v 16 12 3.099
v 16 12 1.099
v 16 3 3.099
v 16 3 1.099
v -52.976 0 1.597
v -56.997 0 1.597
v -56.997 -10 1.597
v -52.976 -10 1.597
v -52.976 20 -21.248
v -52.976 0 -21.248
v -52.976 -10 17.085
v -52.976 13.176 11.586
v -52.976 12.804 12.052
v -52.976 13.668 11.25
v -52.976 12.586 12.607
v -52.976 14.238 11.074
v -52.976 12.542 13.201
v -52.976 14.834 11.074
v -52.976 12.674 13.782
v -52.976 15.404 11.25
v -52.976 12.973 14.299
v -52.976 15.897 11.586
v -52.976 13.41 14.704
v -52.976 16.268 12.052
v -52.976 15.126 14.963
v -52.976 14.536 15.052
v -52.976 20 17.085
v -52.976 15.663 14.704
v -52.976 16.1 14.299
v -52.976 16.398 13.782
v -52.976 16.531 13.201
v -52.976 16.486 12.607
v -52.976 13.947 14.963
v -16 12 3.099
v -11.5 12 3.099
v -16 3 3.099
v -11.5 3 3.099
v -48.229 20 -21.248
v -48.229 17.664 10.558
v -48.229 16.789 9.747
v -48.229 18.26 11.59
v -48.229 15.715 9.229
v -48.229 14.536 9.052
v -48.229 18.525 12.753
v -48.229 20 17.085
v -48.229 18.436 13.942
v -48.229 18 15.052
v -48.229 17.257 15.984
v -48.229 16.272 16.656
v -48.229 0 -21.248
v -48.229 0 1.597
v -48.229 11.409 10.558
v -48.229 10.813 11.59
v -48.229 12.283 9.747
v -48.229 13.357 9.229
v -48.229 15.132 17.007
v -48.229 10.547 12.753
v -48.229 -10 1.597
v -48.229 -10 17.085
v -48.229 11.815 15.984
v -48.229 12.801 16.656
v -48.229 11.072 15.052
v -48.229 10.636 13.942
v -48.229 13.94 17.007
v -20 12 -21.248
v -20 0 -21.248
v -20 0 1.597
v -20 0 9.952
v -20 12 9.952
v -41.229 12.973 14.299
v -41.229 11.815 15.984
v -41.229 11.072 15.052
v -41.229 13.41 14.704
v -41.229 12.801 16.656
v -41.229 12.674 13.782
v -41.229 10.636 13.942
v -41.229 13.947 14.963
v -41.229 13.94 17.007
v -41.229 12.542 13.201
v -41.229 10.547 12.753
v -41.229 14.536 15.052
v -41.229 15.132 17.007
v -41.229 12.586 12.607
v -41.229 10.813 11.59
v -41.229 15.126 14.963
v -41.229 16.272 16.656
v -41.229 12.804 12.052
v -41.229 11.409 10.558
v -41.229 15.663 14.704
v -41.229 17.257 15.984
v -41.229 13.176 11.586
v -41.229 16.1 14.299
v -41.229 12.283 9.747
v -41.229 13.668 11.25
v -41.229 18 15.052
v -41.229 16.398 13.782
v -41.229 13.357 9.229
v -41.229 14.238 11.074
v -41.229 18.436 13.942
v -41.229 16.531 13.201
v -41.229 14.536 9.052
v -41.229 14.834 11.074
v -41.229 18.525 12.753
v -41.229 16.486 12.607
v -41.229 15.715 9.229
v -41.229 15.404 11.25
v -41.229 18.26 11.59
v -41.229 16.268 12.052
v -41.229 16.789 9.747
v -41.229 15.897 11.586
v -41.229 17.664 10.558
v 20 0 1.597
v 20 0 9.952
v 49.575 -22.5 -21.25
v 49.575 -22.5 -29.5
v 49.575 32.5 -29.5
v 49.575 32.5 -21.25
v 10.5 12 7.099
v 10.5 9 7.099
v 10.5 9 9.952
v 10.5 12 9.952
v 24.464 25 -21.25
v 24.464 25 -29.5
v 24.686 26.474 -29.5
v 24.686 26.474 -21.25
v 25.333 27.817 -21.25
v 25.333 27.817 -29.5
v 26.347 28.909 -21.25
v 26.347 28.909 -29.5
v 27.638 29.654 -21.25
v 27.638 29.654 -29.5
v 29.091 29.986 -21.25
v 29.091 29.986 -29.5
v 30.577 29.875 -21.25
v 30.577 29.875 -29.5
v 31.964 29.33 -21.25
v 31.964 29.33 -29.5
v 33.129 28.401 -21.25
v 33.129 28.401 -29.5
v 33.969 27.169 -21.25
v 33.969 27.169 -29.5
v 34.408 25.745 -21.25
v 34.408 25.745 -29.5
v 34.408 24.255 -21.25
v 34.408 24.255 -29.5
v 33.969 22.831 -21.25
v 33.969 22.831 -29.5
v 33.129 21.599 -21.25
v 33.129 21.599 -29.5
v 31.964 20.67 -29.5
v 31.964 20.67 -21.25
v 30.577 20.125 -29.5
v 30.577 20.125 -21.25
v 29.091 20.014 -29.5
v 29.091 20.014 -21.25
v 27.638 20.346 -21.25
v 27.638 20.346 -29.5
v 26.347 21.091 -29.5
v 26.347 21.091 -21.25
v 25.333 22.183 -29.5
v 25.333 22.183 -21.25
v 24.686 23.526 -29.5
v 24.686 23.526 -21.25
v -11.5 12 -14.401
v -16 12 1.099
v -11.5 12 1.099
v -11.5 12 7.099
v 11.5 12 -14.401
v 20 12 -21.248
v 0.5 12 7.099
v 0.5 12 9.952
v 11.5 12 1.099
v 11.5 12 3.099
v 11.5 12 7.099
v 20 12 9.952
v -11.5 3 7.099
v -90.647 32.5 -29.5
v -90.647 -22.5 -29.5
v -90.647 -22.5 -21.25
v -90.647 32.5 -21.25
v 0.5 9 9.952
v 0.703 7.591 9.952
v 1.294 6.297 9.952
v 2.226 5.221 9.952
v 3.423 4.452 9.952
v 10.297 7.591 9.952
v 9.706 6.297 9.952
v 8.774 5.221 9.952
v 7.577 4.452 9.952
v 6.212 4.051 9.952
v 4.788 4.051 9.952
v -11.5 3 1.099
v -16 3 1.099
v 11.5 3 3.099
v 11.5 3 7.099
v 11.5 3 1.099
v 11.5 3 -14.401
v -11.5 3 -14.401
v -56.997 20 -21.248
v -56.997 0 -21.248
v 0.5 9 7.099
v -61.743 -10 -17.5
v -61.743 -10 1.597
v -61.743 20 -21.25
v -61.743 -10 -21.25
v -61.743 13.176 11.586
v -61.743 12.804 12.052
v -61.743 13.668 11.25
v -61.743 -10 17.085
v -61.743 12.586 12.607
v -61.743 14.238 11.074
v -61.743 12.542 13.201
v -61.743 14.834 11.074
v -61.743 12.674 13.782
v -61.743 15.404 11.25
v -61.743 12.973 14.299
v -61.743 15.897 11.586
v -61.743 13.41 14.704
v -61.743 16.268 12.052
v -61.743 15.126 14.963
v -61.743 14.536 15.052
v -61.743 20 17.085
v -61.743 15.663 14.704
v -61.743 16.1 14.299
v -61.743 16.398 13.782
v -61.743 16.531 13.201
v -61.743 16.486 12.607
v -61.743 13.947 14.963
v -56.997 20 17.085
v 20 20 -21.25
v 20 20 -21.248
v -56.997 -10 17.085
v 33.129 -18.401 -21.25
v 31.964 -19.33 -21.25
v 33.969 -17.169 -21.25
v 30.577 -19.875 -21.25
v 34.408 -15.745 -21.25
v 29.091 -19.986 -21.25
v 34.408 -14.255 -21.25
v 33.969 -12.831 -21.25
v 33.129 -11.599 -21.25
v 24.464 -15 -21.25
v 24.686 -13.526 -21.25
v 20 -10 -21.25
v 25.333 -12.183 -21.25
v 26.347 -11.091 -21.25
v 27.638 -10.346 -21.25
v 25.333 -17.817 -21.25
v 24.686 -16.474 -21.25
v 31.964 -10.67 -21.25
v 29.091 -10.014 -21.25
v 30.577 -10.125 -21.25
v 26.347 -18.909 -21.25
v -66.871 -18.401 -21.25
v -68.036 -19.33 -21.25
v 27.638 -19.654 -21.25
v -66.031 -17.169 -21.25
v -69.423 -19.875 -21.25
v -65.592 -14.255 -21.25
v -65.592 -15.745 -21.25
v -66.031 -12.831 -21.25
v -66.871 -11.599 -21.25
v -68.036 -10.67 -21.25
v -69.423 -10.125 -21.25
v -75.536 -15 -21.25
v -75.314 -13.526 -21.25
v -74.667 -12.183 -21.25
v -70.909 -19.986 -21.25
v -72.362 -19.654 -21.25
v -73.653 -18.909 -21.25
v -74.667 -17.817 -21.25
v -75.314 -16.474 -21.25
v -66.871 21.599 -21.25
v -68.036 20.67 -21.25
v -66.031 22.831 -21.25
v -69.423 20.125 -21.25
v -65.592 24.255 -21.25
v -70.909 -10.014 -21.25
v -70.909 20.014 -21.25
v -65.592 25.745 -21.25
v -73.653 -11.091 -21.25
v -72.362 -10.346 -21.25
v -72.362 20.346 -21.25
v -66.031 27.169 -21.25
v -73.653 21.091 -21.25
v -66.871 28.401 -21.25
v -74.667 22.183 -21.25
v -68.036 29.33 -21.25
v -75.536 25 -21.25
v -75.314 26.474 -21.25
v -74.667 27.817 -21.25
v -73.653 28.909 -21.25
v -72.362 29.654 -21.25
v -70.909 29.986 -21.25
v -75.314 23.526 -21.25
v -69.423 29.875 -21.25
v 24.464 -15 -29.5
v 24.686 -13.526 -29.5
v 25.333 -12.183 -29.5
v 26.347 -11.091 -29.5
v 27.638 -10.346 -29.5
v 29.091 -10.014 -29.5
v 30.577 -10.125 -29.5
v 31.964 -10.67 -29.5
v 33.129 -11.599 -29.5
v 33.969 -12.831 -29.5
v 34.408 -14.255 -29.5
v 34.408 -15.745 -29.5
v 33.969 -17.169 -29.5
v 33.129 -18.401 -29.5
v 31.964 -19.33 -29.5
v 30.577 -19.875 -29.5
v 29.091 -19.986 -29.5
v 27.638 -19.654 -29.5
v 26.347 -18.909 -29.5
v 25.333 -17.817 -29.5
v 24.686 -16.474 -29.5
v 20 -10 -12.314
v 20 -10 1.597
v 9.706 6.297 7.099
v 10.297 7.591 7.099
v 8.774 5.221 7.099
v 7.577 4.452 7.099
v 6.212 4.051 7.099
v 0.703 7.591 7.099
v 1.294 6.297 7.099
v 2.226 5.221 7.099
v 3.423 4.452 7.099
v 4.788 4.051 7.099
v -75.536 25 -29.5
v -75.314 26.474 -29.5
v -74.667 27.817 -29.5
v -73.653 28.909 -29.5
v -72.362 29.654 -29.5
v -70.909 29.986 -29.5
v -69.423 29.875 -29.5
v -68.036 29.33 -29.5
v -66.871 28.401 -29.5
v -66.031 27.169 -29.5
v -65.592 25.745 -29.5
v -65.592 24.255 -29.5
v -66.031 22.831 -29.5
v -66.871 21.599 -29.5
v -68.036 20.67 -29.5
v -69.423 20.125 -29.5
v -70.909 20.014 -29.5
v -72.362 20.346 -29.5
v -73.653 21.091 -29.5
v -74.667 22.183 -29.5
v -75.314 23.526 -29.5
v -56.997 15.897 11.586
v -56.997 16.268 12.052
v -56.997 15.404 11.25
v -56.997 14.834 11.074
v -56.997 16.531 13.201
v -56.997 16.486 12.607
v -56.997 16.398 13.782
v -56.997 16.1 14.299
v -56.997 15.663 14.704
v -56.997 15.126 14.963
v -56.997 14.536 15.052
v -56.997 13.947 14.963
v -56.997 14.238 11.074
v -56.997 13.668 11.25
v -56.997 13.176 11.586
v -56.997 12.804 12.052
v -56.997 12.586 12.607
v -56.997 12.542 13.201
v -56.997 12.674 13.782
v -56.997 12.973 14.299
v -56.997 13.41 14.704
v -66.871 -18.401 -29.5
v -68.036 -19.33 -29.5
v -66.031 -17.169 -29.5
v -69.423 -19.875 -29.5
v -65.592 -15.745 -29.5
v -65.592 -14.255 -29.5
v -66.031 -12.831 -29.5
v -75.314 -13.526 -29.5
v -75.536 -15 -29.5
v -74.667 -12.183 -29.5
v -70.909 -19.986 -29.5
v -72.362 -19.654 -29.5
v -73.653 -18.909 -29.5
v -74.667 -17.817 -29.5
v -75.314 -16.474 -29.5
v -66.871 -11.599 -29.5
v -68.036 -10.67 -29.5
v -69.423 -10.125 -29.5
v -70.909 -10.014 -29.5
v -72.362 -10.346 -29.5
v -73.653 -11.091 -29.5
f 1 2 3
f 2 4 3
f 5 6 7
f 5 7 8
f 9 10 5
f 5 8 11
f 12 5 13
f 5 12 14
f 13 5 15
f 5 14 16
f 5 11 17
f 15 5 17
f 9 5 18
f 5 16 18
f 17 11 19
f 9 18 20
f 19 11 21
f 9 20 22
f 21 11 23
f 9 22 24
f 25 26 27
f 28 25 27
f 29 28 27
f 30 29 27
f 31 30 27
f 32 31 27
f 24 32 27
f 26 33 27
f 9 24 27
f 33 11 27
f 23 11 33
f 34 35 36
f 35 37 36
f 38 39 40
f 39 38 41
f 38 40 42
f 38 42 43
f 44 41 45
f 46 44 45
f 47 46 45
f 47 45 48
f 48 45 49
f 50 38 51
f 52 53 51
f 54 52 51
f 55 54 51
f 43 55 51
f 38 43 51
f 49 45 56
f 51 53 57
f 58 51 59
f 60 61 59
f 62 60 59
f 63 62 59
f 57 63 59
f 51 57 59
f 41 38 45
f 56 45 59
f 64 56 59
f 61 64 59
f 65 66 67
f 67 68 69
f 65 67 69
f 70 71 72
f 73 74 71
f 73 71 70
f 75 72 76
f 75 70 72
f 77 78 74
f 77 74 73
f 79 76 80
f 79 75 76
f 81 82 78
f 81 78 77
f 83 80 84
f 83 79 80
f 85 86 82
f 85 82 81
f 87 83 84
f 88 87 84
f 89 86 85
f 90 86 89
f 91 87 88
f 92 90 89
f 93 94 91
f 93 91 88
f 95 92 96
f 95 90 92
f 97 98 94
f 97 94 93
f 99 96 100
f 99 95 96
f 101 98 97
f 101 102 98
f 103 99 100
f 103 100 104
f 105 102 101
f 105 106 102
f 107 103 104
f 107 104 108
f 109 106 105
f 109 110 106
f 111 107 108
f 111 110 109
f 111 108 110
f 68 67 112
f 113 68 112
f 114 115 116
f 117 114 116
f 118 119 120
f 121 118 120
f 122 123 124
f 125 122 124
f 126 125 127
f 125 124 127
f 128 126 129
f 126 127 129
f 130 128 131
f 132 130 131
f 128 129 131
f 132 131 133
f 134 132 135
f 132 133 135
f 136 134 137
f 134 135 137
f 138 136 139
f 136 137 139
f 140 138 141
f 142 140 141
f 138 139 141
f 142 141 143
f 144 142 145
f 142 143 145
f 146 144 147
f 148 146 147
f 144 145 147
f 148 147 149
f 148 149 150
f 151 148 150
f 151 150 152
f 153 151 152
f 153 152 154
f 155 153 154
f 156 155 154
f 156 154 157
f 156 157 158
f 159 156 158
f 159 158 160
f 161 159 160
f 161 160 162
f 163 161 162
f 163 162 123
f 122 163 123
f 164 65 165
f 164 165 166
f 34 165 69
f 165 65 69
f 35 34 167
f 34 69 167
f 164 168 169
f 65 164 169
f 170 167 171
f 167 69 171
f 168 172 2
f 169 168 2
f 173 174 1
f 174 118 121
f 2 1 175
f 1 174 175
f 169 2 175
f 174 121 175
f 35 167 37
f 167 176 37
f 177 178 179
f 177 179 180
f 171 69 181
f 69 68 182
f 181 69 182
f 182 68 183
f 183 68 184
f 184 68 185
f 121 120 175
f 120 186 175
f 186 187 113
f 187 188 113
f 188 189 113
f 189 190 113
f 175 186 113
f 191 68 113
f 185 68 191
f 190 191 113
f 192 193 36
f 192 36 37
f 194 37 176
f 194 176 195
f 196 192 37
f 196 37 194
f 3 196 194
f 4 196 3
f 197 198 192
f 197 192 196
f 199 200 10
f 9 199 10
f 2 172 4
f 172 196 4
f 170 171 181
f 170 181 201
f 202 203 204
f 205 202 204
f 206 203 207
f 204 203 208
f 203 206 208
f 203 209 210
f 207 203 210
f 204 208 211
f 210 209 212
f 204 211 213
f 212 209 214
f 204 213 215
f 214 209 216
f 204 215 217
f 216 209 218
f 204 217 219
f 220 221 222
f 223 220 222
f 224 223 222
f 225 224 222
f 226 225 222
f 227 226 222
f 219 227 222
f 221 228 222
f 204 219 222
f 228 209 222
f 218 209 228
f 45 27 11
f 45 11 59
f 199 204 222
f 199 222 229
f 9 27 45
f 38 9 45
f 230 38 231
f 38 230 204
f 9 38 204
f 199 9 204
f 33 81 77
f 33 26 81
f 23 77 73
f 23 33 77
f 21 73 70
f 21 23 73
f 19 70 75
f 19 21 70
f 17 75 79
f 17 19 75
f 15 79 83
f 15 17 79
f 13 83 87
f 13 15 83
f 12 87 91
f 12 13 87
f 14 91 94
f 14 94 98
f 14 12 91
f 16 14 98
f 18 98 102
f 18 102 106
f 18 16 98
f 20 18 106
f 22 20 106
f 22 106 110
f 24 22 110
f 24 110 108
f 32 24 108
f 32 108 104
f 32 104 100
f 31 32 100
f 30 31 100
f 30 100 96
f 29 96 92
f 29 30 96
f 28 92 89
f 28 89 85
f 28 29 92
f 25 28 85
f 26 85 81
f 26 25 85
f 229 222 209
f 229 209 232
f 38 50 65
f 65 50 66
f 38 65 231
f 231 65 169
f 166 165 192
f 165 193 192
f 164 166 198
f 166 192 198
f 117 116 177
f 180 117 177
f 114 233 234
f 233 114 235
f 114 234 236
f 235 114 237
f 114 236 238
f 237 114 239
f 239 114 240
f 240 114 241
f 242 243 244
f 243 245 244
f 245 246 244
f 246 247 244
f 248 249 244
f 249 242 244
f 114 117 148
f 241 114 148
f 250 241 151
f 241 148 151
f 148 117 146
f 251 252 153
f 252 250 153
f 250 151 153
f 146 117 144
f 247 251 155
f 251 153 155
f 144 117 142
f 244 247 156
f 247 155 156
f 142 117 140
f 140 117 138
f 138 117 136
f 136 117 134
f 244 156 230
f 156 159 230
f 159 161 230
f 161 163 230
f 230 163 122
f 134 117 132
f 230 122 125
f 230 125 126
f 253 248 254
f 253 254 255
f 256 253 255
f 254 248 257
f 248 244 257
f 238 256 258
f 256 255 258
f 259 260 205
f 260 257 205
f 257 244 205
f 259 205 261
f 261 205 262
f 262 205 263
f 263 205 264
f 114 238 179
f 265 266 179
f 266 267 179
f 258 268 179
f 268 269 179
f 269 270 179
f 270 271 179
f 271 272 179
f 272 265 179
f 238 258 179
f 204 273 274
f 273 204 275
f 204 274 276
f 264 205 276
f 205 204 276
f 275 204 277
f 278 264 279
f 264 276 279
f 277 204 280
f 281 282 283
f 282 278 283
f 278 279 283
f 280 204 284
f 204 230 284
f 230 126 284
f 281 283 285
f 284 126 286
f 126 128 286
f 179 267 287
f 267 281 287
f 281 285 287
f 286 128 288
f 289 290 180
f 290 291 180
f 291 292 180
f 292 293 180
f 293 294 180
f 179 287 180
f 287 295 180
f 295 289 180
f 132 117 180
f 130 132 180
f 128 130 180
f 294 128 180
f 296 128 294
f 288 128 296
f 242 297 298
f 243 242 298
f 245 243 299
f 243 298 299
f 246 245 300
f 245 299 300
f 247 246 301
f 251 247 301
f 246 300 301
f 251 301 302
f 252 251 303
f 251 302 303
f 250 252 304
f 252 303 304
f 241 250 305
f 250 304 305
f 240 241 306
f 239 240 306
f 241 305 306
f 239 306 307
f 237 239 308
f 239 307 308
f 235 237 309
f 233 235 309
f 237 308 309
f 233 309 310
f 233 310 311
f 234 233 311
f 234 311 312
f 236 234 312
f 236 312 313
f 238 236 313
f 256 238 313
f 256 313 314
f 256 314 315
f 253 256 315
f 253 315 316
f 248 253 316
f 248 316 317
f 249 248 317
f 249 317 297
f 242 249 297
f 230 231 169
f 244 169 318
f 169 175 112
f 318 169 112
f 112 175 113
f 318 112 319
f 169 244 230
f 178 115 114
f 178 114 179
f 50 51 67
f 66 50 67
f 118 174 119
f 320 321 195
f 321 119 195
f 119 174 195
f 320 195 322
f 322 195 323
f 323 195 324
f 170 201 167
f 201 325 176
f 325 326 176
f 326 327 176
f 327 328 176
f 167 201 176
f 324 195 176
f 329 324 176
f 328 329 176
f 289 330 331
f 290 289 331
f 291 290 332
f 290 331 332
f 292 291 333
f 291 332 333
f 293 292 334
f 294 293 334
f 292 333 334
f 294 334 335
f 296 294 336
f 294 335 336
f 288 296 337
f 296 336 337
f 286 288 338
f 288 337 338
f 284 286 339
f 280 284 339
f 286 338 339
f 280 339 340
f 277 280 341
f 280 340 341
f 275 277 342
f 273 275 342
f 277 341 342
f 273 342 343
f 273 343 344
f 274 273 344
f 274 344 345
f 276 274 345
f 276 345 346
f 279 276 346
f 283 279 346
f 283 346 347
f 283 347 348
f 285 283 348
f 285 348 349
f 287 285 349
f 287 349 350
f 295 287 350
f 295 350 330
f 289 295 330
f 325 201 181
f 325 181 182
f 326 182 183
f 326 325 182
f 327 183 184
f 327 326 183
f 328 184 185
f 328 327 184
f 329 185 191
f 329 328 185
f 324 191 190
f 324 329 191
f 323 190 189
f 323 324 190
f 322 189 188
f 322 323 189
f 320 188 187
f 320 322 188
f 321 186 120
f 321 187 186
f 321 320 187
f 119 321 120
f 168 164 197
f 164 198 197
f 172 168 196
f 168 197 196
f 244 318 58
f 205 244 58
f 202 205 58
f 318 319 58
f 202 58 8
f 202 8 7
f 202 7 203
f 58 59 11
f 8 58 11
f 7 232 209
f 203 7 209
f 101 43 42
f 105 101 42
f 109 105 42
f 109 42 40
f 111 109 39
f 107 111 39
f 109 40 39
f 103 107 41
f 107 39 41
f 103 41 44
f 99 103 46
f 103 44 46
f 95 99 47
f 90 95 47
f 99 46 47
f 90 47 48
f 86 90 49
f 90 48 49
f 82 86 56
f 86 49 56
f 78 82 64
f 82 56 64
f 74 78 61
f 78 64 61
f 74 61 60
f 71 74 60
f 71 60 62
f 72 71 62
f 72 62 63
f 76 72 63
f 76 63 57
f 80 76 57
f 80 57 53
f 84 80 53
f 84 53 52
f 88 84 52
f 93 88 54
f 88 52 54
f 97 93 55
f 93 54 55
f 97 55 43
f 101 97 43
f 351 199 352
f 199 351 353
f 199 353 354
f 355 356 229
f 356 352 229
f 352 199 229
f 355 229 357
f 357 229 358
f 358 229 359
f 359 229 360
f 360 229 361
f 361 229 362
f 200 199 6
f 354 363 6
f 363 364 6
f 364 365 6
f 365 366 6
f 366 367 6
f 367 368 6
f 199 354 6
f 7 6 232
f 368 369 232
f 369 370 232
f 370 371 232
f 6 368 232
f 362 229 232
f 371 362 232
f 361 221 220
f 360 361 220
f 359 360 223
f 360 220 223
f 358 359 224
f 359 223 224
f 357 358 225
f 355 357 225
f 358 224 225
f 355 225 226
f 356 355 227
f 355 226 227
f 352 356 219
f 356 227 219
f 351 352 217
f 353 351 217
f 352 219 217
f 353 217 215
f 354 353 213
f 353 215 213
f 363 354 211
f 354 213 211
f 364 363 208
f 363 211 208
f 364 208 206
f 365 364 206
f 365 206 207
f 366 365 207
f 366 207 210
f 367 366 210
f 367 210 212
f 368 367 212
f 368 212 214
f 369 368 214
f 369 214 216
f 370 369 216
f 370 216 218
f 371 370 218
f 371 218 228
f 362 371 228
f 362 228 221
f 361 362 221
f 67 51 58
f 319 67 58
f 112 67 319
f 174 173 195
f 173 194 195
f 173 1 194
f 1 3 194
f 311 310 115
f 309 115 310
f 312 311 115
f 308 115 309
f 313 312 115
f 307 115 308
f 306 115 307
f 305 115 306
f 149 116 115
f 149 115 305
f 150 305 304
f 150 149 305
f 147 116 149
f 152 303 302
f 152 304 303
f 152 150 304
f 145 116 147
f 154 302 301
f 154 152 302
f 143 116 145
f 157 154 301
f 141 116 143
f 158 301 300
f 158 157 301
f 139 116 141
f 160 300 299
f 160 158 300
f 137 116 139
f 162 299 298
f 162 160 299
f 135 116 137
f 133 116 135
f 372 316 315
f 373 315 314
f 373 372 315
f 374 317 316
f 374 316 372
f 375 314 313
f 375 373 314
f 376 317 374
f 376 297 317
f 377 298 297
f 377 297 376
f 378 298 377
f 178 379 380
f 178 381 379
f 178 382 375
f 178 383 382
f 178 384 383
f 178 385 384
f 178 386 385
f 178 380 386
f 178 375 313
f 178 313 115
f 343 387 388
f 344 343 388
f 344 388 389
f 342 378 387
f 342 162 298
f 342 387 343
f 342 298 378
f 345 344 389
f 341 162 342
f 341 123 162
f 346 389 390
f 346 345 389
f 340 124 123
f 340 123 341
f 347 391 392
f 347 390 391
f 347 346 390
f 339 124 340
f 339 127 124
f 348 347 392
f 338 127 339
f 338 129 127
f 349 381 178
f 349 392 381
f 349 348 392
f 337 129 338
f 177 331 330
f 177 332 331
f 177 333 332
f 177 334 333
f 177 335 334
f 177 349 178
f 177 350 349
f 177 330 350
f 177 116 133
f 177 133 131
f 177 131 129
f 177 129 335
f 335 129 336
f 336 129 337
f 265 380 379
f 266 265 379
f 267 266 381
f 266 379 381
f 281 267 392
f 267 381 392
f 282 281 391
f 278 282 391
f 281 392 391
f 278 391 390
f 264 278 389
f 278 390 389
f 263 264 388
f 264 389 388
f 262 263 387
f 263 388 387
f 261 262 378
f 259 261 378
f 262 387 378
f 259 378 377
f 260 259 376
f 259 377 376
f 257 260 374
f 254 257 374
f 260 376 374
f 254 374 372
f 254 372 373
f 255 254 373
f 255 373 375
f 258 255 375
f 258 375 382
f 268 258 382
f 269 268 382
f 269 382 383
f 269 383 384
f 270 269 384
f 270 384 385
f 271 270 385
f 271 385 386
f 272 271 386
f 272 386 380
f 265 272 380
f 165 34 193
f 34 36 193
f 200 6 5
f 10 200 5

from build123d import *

# Parameters (mm, degrees)
SKETCH1_W                       = 40
SKETCH1_H                       = 35
BOSS_EXTRUDE1_DEPTH             = 18
CAVITY1_START                   = -14.401086919
CAVITY1_OUTLINE_W               = 23
CAVITY1_OUTLINE_H               = 12
CAVITY1_DEPTH                   = 21.5
CAVITY1_START_2                 = 7.098913081
CAVITY1_2_OUTLINE_R             = 5
CAVITY1_2_DEPTH                 = 3
CAVITY1_START_3                 = 1.098913081
CAVITY1_3_DEPTH                 = 2
CAVITY1_START_4                 = 10.098913081
CAVITY1_4_OUTLINE_R             = 2.5
CAVITY1_4_DEPTH                 = 4
CUT_EXTRUDE1_DEPTH              = 42.733432002
CUT_EXTRUDE1_DEPTH_BACK         = 42.733432002
SKETCH2_W                       = 52.530025258
SKETCH2_H                       = 12.54309889
CUT_EXTRUDE2_DEPTH              = 43
SKETCH4_W                       = 40
SKETCH4_H                       = 7.548254148
CUT_EXTRUDE3_DEPTH              = 43
BOSS_EXTRUDE2_DEPTH             = 3
SKETCH6_W                       = 81.743347259
SKETCH6_H                       = 13.911125845
BOSS_EXTRUDE3_DEPTH             = 10
SKETCH8_W                       = 4.746846532
SKETCH8_H                       = 29.399300547
BOSS_EXTRUDE4_DEPTH             = 20
BOSS_EXTRUDE4_DIRECTION_2_REACH = 67.288
SKETCH9_R                       = 2
CUT_EXTRUDE4_DEPTH              = 34
SKETCH10_R                      = 4
SKETCH10_R_2                    = 2
BOSS_EXTRUDE5_DEPTH             = 7
BOSS_EXTRUDE6_DEPTH             = 5.186094658
BOSS_EXTRUDE7_DEPTH             = 12
SKETCH14_W                      = 81.743347259
SKETCH14_H                      = 8.25177529
BOSS_EXTRUDE8_DEPTH             = 20
SKETCH16_W                      = 140.221979832
SKETCH16_H                      = 55
BOSS_EXTRUDE9_DEPTH             = 8.25
SKETCH17_R                      = 5
CUT_EXTRUDE5_DEPTH              = 10


# Read off the part's stored shape, not the designer's step: Cavity1
with BuildPart() as part:
    # Sketch1 → Boss-Extrude1 (new body)
    with BuildSketch(Plane(origin=(0, 0, 0), x_dir=(1, 0, 0), z_dir=(0, 1, 0))):
        Rectangle(SKETCH1_W, SKETCH1_H)
    extrude(amount=BOSS_EXTRUDE1_DEPTH)

    # Cavity1 outline → Cavity1 (cut)
    with BuildSketch(Plane.XY.offset(CAVITY1_START)):
        with Locations((0, 9)):
            Rectangle(CAVITY1_OUTLINE_W, CAVITY1_OUTLINE_H)
    extrude(amount=CAVITY1_DEPTH, mode=Mode.SUBTRACT)

    # Cavity1 2 outline → Cavity1 2 (cut)
    with BuildSketch(Plane.XY.offset(CAVITY1_START_2)):
        with Locations((5.5, 9)):
            Circle(CAVITY1_2_OUTLINE_R)
    extrude(amount=CAVITY1_2_DEPTH, mode=Mode.SUBTRACT)

    # Cavity1 3 outline → Cavity1 3 (cut)
    with BuildSketch(Plane.XY.offset(CAVITY1_START_3)):
        with BuildLine():
            Line((-11.5, 15), (-16, 15))
            Line((-16, 15), (-16, 10.821261352))
            Line((-16, 10.821261352), (-14.337589365, 10.821261352))
            ThreePointArc((-14.337589365, 10.821261352), (-12.516328014, 9), (-14.337589365, 7.178738648))
            Line((-14.337589365, 7.178738648), (-16, 7.178738648))
            Line((-16, 7.178738648), (-16, 3))
            Line((-16, 3), (-11.5, 3))
            Line((-11.5, 3), (-11.5, 15))
        make_face()
        with BuildLine():
            Line((16, 15), (11.5, 15))
            Line((11.5, 15), (11.5, 3))
            Line((11.5, 3), (16, 3))
            Line((16, 3), (16, 7.178738648))
            Line((16, 7.178738648), (14.337589365, 7.178738648))
            ThreePointArc((14.337589365, 7.178738648), (12.516328014, 9), (14.337589365, 10.821261352))
            Line((14.337589365, 10.821261352), (16, 10.821261352))
            Line((16, 10.821261352), (16, 15))
        make_face()
    extrude(amount=CAVITY1_3_DEPTH, mode=Mode.SUBTRACT)

    # Cavity1 4 outline → Cavity1 4 (cut)
    with BuildSketch(Plane.XY.offset(CAVITY1_START_4)):
        with Locations((5.5, 9)):
            Circle(CAVITY1_4_OUTLINE_R)
    extrude(amount=CAVITY1_4_DEPTH, mode=Mode.SUBTRACT)

    # Sketch2 → Cut-Extrude1 (cut, two sides: drawn at the far end of the back side and taken through both)
    with BuildSketch(Plane.XY.offset(-14.401086919).offset(-CUT_EXTRUDE1_DEPTH_BACK)):
        with Locations((5.5, 15.271549445)):
            Rectangle(SKETCH2_W, SKETCH2_H)
    extrude(amount=CUT_EXTRUDE1_DEPTH + CUT_EXTRUDE1_DEPTH_BACK, mode=Mode.SUBTRACT)

    # Sketch3 → Cut-Extrude2 (cut)
    with BuildSketch(Plane(origin=(0, 3, 0), x_dir=(1, 0, 0), z_dir=(0, 1, 0))):
        Polygon((-11.5, -3.098913081), (-11.5, -7.098913081), (11.5, -7.098913081), (11.5, -3.098913081), (16, -3.098913081), (16, -1.098913081), (11.5, -1.098913081), (11.5, 14.401086919), (-11.5, 14.401086919), (-11.5, -1.098913081), (-16, -1.098913081), (-16, -3.098913081), align=None)
    extrude(amount=CUT_EXTRUDE2_DEPTH, mode=Mode.SUBTRACT)

    # Sketch4 → Cut-Extrude3 (cut)
    with BuildSketch(Plane(origin=(0, 9, 0), x_dir=(1, 0, 0), z_dir=(0, 1, 0))):
        with Locations((0, -13.725872926)):
            Rectangle(SKETCH4_W, SKETCH4_H)
    extrude(amount=-CUT_EXTRUDE3_DEPTH, mode=Mode.SUBTRACT)

    # Sketch5 → Boss-Extrude2 (add)
    with BuildSketch(Plane(origin=(0, 9, 0), x_dir=(1, 0, 0), z_dir=(0, 1, 0))):
        Polygon((10.5, -9.951745852), (20, -9.951745852), (20, 17.5), (-20, 17.5), (-20, -9.951745852), (0.5, -9.951745852), (0.5, -7.098913081), (-11.5, -7.098913081), (-11.5, -3.098913081), (-16, -3.098913081), (-16, -1.098913081), (-11.5, -1.098913081), (-11.5, 14.401086919), (11.5, 14.401086919), (11.5, -1.098913081), (16, -1.098913081), (16, -3.098913081), (11.5, -3.098913081), (11.5, -7.098913081), (10.5, -7.098913081), align=None)
    extrude(amount=BOSS_EXTRUDE2_DEPTH)

    # Sketch6 → Boss-Extrude3 (add)
    with BuildSketch(Plane.XZ):
        with Locations((-20.87167363, -5.358342419)):
            Rectangle(SKETCH6_W, SKETCH6_H)
    extrude(amount=BOSS_EXTRUDE3_DEPTH)

    # Sketch8 → Boss-Extrude4 (add)
    with BuildSketch(Plane(origin=(0, 0, 0), x_dir=(1, 0, 0), z_dir=(0, 1, 0))):
        with Locations((-59.369923993, -2.385744932)):
            Rectangle(SKETCH8_W, SKETCH8_H)
        with Locations((-50.602645133, -2.385744932)):
            Rectangle(SKETCH8_W, SKETCH8_H)
    extrude(amount=BOSS_EXTRUDE4_DEPTH)

    # Boss-Extrude4 direction 2: up to this face of the body (flat: up to its plane)
    boss_extrude4_direction_2_end = Plane(part.part.faces().sort_by_distance((-20.87167363, -10, -5.358342419))[0])
    # Sketch8 → Boss-Extrude4 direction 2 (add, up to the picked face)
    with BuildSketch(Plane(origin=(0, 0, 0), x_dir=(1, 0, 0), z_dir=(0, 1, 0)), mode=Mode.PRIVATE) as boss_extrude4_direction_2_sk1:
        with Locations((-59.369923993, -2.385744932)):
            Rectangle(SKETCH8_W, SKETCH8_H)
    boss_extrude4_direction_2_tool1 = split(extrude(boss_extrude4_direction_2_sk1.sketch, amount=-BOSS_EXTRUDE4_DIRECTION_2_REACH, mode=Mode.PRIVATE), bisect_by=boss_extrude4_direction_2_end, keep=Keep.BOTH, mode=Mode.PRIVATE)
    # Sketch8 → Boss-Extrude4 direction 2 (add, up to the picked face)
    with BuildSketch(Plane(origin=(0, 0, 0), x_dir=(1, 0, 0), z_dir=(0, 1, 0)), mode=Mode.PRIVATE) as boss_extrude4_direction_2_sk2:
        with Locations((-50.602645133, -2.385744932)):
            Rectangle(SKETCH8_W, SKETCH8_H)
    boss_extrude4_direction_2_tool2 = split(extrude(boss_extrude4_direction_2_sk2.sketch, amount=-BOSS_EXTRUDE4_DIRECTION_2_REACH, mode=Mode.PRIVATE), bisect_by=boss_extrude4_direction_2_end, keep=Keep.BOTH, mode=Mode.PRIVATE)
    add(boss_extrude4_direction_2_tool1.solids().sort_by(Axis((-59.369924, 0, 2.385745), (0, -1, 0)))[0])
    add(boss_extrude4_direction_2_tool2.solids().sort_by(Axis((-50.602645, 0, 2.385745), (0, -1, 0)))[0])

    # Sketch9 → Cut-Extrude4 (cut)
    with BuildSketch(Plane.ZY.offset(61.743347259)):
        with Locations((13.051745852, 14.536175319)):
            Circle(SKETCH9_R)
    extrude(amount=-CUT_EXTRUDE4_DEPTH, mode=Mode.SUBTRACT)

    # Sketch10 → Boss-Extrude5 (add)
    with BuildSketch(Plane(origin=(-48.229221867, 0, 0), x_dir=(0, 0, -1), z_dir=(1, 0, 0))):
        with Locations((-13.051745852, 14.536175319)):
            Circle(SKETCH10_R)
        with Locations(Location((-13.051745852, 14.536175319, 0), (0, 0, 180))):
            Circle(SKETCH10_R_2, mode=Mode.SUBTRACT)
    extrude(amount=BOSS_EXTRUDE5_DEPTH)

    # Sketch11 → Boss-Extrude6 (add)
    with BuildSketch(Plane(origin=(0, 0, -12.313905342), x_dir=(-1, 0, 0), z_dir=(0, 0, -1))):
        Polygon((61.743347259, -10), (61.743347259, 20), (56.996500727, 20), (56.996500727, 0), (52.976068399, 0), (52.976068399, 20), (48.229221867, 20), (48.229221867, 0), (20, 0), (-20, 0), (-20, -10), align=None)
    extrude(amount=BOSS_EXTRUDE6_DEPTH)

    # Sketch12 → Boss-Extrude7 (add)
    with BuildSketch(Plane(origin=(0, 0, -17.5), x_dir=(-1, 0, 0), z_dir=(0, 0, -1))):
        Polygon((20, 0), (20, 12), (-20, 12), (-20, -10), (61.743347259, -10), (61.743347259, 20), (56.996500727, 20), (56.996500727, 0), (52.976068399, 0), (52.976068399, 20), (48.229221867, 20), (48.229221867, 0), align=None)
    extrude(amount=BOSS_EXTRUDE7_DEPTH)

    # Sketch14 → Boss-Extrude8 (add)
    with BuildSketch(Plane(origin=(0, 0, 0), x_dir=(1, 0, 0), z_dir=(0, 1, 0))):
        with Locations((-20.87167363, 25.374112355)):
            Rectangle(SKETCH14_W, SKETCH14_H)
    extrude(amount=BOSS_EXTRUDE8_DEPTH)

    # Sketch16 → Boss-Extrude9 (add)
    with BuildSketch(Plane(origin=(0, 0, -29.5), x_dir=(-1, 0, 0), z_dir=(0, 0, -1))):
        with Locations((20.535780022, 5)):
            Rectangle(SKETCH16_W, SKETCH16_H)
    extrude(amount=-BOSS_EXTRUDE9_DEPTH)

    # Sketch17 → Cut-Extrude5 (cut)
    with BuildSketch(Plane(origin=(0, 0, -29.5), x_dir=(-1, 0, 0), z_dir=(0, 0, -1))):
        with Locations((-29.464219978, 25)):
            Circle(SKETCH17_R)
        with Locations((-29.464219978, -15)):
            Circle(SKETCH17_R)
        with Locations((70.535780022, 25)):
            Circle(SKETCH17_R)
        with Locations((70.535780022, -15)):
            Circle(SKETCH17_R)
    extrude(amount=-CUT_EXTRUDE5_DEPTH, mode=Mode.SUBTRACT)


solid = part.part
